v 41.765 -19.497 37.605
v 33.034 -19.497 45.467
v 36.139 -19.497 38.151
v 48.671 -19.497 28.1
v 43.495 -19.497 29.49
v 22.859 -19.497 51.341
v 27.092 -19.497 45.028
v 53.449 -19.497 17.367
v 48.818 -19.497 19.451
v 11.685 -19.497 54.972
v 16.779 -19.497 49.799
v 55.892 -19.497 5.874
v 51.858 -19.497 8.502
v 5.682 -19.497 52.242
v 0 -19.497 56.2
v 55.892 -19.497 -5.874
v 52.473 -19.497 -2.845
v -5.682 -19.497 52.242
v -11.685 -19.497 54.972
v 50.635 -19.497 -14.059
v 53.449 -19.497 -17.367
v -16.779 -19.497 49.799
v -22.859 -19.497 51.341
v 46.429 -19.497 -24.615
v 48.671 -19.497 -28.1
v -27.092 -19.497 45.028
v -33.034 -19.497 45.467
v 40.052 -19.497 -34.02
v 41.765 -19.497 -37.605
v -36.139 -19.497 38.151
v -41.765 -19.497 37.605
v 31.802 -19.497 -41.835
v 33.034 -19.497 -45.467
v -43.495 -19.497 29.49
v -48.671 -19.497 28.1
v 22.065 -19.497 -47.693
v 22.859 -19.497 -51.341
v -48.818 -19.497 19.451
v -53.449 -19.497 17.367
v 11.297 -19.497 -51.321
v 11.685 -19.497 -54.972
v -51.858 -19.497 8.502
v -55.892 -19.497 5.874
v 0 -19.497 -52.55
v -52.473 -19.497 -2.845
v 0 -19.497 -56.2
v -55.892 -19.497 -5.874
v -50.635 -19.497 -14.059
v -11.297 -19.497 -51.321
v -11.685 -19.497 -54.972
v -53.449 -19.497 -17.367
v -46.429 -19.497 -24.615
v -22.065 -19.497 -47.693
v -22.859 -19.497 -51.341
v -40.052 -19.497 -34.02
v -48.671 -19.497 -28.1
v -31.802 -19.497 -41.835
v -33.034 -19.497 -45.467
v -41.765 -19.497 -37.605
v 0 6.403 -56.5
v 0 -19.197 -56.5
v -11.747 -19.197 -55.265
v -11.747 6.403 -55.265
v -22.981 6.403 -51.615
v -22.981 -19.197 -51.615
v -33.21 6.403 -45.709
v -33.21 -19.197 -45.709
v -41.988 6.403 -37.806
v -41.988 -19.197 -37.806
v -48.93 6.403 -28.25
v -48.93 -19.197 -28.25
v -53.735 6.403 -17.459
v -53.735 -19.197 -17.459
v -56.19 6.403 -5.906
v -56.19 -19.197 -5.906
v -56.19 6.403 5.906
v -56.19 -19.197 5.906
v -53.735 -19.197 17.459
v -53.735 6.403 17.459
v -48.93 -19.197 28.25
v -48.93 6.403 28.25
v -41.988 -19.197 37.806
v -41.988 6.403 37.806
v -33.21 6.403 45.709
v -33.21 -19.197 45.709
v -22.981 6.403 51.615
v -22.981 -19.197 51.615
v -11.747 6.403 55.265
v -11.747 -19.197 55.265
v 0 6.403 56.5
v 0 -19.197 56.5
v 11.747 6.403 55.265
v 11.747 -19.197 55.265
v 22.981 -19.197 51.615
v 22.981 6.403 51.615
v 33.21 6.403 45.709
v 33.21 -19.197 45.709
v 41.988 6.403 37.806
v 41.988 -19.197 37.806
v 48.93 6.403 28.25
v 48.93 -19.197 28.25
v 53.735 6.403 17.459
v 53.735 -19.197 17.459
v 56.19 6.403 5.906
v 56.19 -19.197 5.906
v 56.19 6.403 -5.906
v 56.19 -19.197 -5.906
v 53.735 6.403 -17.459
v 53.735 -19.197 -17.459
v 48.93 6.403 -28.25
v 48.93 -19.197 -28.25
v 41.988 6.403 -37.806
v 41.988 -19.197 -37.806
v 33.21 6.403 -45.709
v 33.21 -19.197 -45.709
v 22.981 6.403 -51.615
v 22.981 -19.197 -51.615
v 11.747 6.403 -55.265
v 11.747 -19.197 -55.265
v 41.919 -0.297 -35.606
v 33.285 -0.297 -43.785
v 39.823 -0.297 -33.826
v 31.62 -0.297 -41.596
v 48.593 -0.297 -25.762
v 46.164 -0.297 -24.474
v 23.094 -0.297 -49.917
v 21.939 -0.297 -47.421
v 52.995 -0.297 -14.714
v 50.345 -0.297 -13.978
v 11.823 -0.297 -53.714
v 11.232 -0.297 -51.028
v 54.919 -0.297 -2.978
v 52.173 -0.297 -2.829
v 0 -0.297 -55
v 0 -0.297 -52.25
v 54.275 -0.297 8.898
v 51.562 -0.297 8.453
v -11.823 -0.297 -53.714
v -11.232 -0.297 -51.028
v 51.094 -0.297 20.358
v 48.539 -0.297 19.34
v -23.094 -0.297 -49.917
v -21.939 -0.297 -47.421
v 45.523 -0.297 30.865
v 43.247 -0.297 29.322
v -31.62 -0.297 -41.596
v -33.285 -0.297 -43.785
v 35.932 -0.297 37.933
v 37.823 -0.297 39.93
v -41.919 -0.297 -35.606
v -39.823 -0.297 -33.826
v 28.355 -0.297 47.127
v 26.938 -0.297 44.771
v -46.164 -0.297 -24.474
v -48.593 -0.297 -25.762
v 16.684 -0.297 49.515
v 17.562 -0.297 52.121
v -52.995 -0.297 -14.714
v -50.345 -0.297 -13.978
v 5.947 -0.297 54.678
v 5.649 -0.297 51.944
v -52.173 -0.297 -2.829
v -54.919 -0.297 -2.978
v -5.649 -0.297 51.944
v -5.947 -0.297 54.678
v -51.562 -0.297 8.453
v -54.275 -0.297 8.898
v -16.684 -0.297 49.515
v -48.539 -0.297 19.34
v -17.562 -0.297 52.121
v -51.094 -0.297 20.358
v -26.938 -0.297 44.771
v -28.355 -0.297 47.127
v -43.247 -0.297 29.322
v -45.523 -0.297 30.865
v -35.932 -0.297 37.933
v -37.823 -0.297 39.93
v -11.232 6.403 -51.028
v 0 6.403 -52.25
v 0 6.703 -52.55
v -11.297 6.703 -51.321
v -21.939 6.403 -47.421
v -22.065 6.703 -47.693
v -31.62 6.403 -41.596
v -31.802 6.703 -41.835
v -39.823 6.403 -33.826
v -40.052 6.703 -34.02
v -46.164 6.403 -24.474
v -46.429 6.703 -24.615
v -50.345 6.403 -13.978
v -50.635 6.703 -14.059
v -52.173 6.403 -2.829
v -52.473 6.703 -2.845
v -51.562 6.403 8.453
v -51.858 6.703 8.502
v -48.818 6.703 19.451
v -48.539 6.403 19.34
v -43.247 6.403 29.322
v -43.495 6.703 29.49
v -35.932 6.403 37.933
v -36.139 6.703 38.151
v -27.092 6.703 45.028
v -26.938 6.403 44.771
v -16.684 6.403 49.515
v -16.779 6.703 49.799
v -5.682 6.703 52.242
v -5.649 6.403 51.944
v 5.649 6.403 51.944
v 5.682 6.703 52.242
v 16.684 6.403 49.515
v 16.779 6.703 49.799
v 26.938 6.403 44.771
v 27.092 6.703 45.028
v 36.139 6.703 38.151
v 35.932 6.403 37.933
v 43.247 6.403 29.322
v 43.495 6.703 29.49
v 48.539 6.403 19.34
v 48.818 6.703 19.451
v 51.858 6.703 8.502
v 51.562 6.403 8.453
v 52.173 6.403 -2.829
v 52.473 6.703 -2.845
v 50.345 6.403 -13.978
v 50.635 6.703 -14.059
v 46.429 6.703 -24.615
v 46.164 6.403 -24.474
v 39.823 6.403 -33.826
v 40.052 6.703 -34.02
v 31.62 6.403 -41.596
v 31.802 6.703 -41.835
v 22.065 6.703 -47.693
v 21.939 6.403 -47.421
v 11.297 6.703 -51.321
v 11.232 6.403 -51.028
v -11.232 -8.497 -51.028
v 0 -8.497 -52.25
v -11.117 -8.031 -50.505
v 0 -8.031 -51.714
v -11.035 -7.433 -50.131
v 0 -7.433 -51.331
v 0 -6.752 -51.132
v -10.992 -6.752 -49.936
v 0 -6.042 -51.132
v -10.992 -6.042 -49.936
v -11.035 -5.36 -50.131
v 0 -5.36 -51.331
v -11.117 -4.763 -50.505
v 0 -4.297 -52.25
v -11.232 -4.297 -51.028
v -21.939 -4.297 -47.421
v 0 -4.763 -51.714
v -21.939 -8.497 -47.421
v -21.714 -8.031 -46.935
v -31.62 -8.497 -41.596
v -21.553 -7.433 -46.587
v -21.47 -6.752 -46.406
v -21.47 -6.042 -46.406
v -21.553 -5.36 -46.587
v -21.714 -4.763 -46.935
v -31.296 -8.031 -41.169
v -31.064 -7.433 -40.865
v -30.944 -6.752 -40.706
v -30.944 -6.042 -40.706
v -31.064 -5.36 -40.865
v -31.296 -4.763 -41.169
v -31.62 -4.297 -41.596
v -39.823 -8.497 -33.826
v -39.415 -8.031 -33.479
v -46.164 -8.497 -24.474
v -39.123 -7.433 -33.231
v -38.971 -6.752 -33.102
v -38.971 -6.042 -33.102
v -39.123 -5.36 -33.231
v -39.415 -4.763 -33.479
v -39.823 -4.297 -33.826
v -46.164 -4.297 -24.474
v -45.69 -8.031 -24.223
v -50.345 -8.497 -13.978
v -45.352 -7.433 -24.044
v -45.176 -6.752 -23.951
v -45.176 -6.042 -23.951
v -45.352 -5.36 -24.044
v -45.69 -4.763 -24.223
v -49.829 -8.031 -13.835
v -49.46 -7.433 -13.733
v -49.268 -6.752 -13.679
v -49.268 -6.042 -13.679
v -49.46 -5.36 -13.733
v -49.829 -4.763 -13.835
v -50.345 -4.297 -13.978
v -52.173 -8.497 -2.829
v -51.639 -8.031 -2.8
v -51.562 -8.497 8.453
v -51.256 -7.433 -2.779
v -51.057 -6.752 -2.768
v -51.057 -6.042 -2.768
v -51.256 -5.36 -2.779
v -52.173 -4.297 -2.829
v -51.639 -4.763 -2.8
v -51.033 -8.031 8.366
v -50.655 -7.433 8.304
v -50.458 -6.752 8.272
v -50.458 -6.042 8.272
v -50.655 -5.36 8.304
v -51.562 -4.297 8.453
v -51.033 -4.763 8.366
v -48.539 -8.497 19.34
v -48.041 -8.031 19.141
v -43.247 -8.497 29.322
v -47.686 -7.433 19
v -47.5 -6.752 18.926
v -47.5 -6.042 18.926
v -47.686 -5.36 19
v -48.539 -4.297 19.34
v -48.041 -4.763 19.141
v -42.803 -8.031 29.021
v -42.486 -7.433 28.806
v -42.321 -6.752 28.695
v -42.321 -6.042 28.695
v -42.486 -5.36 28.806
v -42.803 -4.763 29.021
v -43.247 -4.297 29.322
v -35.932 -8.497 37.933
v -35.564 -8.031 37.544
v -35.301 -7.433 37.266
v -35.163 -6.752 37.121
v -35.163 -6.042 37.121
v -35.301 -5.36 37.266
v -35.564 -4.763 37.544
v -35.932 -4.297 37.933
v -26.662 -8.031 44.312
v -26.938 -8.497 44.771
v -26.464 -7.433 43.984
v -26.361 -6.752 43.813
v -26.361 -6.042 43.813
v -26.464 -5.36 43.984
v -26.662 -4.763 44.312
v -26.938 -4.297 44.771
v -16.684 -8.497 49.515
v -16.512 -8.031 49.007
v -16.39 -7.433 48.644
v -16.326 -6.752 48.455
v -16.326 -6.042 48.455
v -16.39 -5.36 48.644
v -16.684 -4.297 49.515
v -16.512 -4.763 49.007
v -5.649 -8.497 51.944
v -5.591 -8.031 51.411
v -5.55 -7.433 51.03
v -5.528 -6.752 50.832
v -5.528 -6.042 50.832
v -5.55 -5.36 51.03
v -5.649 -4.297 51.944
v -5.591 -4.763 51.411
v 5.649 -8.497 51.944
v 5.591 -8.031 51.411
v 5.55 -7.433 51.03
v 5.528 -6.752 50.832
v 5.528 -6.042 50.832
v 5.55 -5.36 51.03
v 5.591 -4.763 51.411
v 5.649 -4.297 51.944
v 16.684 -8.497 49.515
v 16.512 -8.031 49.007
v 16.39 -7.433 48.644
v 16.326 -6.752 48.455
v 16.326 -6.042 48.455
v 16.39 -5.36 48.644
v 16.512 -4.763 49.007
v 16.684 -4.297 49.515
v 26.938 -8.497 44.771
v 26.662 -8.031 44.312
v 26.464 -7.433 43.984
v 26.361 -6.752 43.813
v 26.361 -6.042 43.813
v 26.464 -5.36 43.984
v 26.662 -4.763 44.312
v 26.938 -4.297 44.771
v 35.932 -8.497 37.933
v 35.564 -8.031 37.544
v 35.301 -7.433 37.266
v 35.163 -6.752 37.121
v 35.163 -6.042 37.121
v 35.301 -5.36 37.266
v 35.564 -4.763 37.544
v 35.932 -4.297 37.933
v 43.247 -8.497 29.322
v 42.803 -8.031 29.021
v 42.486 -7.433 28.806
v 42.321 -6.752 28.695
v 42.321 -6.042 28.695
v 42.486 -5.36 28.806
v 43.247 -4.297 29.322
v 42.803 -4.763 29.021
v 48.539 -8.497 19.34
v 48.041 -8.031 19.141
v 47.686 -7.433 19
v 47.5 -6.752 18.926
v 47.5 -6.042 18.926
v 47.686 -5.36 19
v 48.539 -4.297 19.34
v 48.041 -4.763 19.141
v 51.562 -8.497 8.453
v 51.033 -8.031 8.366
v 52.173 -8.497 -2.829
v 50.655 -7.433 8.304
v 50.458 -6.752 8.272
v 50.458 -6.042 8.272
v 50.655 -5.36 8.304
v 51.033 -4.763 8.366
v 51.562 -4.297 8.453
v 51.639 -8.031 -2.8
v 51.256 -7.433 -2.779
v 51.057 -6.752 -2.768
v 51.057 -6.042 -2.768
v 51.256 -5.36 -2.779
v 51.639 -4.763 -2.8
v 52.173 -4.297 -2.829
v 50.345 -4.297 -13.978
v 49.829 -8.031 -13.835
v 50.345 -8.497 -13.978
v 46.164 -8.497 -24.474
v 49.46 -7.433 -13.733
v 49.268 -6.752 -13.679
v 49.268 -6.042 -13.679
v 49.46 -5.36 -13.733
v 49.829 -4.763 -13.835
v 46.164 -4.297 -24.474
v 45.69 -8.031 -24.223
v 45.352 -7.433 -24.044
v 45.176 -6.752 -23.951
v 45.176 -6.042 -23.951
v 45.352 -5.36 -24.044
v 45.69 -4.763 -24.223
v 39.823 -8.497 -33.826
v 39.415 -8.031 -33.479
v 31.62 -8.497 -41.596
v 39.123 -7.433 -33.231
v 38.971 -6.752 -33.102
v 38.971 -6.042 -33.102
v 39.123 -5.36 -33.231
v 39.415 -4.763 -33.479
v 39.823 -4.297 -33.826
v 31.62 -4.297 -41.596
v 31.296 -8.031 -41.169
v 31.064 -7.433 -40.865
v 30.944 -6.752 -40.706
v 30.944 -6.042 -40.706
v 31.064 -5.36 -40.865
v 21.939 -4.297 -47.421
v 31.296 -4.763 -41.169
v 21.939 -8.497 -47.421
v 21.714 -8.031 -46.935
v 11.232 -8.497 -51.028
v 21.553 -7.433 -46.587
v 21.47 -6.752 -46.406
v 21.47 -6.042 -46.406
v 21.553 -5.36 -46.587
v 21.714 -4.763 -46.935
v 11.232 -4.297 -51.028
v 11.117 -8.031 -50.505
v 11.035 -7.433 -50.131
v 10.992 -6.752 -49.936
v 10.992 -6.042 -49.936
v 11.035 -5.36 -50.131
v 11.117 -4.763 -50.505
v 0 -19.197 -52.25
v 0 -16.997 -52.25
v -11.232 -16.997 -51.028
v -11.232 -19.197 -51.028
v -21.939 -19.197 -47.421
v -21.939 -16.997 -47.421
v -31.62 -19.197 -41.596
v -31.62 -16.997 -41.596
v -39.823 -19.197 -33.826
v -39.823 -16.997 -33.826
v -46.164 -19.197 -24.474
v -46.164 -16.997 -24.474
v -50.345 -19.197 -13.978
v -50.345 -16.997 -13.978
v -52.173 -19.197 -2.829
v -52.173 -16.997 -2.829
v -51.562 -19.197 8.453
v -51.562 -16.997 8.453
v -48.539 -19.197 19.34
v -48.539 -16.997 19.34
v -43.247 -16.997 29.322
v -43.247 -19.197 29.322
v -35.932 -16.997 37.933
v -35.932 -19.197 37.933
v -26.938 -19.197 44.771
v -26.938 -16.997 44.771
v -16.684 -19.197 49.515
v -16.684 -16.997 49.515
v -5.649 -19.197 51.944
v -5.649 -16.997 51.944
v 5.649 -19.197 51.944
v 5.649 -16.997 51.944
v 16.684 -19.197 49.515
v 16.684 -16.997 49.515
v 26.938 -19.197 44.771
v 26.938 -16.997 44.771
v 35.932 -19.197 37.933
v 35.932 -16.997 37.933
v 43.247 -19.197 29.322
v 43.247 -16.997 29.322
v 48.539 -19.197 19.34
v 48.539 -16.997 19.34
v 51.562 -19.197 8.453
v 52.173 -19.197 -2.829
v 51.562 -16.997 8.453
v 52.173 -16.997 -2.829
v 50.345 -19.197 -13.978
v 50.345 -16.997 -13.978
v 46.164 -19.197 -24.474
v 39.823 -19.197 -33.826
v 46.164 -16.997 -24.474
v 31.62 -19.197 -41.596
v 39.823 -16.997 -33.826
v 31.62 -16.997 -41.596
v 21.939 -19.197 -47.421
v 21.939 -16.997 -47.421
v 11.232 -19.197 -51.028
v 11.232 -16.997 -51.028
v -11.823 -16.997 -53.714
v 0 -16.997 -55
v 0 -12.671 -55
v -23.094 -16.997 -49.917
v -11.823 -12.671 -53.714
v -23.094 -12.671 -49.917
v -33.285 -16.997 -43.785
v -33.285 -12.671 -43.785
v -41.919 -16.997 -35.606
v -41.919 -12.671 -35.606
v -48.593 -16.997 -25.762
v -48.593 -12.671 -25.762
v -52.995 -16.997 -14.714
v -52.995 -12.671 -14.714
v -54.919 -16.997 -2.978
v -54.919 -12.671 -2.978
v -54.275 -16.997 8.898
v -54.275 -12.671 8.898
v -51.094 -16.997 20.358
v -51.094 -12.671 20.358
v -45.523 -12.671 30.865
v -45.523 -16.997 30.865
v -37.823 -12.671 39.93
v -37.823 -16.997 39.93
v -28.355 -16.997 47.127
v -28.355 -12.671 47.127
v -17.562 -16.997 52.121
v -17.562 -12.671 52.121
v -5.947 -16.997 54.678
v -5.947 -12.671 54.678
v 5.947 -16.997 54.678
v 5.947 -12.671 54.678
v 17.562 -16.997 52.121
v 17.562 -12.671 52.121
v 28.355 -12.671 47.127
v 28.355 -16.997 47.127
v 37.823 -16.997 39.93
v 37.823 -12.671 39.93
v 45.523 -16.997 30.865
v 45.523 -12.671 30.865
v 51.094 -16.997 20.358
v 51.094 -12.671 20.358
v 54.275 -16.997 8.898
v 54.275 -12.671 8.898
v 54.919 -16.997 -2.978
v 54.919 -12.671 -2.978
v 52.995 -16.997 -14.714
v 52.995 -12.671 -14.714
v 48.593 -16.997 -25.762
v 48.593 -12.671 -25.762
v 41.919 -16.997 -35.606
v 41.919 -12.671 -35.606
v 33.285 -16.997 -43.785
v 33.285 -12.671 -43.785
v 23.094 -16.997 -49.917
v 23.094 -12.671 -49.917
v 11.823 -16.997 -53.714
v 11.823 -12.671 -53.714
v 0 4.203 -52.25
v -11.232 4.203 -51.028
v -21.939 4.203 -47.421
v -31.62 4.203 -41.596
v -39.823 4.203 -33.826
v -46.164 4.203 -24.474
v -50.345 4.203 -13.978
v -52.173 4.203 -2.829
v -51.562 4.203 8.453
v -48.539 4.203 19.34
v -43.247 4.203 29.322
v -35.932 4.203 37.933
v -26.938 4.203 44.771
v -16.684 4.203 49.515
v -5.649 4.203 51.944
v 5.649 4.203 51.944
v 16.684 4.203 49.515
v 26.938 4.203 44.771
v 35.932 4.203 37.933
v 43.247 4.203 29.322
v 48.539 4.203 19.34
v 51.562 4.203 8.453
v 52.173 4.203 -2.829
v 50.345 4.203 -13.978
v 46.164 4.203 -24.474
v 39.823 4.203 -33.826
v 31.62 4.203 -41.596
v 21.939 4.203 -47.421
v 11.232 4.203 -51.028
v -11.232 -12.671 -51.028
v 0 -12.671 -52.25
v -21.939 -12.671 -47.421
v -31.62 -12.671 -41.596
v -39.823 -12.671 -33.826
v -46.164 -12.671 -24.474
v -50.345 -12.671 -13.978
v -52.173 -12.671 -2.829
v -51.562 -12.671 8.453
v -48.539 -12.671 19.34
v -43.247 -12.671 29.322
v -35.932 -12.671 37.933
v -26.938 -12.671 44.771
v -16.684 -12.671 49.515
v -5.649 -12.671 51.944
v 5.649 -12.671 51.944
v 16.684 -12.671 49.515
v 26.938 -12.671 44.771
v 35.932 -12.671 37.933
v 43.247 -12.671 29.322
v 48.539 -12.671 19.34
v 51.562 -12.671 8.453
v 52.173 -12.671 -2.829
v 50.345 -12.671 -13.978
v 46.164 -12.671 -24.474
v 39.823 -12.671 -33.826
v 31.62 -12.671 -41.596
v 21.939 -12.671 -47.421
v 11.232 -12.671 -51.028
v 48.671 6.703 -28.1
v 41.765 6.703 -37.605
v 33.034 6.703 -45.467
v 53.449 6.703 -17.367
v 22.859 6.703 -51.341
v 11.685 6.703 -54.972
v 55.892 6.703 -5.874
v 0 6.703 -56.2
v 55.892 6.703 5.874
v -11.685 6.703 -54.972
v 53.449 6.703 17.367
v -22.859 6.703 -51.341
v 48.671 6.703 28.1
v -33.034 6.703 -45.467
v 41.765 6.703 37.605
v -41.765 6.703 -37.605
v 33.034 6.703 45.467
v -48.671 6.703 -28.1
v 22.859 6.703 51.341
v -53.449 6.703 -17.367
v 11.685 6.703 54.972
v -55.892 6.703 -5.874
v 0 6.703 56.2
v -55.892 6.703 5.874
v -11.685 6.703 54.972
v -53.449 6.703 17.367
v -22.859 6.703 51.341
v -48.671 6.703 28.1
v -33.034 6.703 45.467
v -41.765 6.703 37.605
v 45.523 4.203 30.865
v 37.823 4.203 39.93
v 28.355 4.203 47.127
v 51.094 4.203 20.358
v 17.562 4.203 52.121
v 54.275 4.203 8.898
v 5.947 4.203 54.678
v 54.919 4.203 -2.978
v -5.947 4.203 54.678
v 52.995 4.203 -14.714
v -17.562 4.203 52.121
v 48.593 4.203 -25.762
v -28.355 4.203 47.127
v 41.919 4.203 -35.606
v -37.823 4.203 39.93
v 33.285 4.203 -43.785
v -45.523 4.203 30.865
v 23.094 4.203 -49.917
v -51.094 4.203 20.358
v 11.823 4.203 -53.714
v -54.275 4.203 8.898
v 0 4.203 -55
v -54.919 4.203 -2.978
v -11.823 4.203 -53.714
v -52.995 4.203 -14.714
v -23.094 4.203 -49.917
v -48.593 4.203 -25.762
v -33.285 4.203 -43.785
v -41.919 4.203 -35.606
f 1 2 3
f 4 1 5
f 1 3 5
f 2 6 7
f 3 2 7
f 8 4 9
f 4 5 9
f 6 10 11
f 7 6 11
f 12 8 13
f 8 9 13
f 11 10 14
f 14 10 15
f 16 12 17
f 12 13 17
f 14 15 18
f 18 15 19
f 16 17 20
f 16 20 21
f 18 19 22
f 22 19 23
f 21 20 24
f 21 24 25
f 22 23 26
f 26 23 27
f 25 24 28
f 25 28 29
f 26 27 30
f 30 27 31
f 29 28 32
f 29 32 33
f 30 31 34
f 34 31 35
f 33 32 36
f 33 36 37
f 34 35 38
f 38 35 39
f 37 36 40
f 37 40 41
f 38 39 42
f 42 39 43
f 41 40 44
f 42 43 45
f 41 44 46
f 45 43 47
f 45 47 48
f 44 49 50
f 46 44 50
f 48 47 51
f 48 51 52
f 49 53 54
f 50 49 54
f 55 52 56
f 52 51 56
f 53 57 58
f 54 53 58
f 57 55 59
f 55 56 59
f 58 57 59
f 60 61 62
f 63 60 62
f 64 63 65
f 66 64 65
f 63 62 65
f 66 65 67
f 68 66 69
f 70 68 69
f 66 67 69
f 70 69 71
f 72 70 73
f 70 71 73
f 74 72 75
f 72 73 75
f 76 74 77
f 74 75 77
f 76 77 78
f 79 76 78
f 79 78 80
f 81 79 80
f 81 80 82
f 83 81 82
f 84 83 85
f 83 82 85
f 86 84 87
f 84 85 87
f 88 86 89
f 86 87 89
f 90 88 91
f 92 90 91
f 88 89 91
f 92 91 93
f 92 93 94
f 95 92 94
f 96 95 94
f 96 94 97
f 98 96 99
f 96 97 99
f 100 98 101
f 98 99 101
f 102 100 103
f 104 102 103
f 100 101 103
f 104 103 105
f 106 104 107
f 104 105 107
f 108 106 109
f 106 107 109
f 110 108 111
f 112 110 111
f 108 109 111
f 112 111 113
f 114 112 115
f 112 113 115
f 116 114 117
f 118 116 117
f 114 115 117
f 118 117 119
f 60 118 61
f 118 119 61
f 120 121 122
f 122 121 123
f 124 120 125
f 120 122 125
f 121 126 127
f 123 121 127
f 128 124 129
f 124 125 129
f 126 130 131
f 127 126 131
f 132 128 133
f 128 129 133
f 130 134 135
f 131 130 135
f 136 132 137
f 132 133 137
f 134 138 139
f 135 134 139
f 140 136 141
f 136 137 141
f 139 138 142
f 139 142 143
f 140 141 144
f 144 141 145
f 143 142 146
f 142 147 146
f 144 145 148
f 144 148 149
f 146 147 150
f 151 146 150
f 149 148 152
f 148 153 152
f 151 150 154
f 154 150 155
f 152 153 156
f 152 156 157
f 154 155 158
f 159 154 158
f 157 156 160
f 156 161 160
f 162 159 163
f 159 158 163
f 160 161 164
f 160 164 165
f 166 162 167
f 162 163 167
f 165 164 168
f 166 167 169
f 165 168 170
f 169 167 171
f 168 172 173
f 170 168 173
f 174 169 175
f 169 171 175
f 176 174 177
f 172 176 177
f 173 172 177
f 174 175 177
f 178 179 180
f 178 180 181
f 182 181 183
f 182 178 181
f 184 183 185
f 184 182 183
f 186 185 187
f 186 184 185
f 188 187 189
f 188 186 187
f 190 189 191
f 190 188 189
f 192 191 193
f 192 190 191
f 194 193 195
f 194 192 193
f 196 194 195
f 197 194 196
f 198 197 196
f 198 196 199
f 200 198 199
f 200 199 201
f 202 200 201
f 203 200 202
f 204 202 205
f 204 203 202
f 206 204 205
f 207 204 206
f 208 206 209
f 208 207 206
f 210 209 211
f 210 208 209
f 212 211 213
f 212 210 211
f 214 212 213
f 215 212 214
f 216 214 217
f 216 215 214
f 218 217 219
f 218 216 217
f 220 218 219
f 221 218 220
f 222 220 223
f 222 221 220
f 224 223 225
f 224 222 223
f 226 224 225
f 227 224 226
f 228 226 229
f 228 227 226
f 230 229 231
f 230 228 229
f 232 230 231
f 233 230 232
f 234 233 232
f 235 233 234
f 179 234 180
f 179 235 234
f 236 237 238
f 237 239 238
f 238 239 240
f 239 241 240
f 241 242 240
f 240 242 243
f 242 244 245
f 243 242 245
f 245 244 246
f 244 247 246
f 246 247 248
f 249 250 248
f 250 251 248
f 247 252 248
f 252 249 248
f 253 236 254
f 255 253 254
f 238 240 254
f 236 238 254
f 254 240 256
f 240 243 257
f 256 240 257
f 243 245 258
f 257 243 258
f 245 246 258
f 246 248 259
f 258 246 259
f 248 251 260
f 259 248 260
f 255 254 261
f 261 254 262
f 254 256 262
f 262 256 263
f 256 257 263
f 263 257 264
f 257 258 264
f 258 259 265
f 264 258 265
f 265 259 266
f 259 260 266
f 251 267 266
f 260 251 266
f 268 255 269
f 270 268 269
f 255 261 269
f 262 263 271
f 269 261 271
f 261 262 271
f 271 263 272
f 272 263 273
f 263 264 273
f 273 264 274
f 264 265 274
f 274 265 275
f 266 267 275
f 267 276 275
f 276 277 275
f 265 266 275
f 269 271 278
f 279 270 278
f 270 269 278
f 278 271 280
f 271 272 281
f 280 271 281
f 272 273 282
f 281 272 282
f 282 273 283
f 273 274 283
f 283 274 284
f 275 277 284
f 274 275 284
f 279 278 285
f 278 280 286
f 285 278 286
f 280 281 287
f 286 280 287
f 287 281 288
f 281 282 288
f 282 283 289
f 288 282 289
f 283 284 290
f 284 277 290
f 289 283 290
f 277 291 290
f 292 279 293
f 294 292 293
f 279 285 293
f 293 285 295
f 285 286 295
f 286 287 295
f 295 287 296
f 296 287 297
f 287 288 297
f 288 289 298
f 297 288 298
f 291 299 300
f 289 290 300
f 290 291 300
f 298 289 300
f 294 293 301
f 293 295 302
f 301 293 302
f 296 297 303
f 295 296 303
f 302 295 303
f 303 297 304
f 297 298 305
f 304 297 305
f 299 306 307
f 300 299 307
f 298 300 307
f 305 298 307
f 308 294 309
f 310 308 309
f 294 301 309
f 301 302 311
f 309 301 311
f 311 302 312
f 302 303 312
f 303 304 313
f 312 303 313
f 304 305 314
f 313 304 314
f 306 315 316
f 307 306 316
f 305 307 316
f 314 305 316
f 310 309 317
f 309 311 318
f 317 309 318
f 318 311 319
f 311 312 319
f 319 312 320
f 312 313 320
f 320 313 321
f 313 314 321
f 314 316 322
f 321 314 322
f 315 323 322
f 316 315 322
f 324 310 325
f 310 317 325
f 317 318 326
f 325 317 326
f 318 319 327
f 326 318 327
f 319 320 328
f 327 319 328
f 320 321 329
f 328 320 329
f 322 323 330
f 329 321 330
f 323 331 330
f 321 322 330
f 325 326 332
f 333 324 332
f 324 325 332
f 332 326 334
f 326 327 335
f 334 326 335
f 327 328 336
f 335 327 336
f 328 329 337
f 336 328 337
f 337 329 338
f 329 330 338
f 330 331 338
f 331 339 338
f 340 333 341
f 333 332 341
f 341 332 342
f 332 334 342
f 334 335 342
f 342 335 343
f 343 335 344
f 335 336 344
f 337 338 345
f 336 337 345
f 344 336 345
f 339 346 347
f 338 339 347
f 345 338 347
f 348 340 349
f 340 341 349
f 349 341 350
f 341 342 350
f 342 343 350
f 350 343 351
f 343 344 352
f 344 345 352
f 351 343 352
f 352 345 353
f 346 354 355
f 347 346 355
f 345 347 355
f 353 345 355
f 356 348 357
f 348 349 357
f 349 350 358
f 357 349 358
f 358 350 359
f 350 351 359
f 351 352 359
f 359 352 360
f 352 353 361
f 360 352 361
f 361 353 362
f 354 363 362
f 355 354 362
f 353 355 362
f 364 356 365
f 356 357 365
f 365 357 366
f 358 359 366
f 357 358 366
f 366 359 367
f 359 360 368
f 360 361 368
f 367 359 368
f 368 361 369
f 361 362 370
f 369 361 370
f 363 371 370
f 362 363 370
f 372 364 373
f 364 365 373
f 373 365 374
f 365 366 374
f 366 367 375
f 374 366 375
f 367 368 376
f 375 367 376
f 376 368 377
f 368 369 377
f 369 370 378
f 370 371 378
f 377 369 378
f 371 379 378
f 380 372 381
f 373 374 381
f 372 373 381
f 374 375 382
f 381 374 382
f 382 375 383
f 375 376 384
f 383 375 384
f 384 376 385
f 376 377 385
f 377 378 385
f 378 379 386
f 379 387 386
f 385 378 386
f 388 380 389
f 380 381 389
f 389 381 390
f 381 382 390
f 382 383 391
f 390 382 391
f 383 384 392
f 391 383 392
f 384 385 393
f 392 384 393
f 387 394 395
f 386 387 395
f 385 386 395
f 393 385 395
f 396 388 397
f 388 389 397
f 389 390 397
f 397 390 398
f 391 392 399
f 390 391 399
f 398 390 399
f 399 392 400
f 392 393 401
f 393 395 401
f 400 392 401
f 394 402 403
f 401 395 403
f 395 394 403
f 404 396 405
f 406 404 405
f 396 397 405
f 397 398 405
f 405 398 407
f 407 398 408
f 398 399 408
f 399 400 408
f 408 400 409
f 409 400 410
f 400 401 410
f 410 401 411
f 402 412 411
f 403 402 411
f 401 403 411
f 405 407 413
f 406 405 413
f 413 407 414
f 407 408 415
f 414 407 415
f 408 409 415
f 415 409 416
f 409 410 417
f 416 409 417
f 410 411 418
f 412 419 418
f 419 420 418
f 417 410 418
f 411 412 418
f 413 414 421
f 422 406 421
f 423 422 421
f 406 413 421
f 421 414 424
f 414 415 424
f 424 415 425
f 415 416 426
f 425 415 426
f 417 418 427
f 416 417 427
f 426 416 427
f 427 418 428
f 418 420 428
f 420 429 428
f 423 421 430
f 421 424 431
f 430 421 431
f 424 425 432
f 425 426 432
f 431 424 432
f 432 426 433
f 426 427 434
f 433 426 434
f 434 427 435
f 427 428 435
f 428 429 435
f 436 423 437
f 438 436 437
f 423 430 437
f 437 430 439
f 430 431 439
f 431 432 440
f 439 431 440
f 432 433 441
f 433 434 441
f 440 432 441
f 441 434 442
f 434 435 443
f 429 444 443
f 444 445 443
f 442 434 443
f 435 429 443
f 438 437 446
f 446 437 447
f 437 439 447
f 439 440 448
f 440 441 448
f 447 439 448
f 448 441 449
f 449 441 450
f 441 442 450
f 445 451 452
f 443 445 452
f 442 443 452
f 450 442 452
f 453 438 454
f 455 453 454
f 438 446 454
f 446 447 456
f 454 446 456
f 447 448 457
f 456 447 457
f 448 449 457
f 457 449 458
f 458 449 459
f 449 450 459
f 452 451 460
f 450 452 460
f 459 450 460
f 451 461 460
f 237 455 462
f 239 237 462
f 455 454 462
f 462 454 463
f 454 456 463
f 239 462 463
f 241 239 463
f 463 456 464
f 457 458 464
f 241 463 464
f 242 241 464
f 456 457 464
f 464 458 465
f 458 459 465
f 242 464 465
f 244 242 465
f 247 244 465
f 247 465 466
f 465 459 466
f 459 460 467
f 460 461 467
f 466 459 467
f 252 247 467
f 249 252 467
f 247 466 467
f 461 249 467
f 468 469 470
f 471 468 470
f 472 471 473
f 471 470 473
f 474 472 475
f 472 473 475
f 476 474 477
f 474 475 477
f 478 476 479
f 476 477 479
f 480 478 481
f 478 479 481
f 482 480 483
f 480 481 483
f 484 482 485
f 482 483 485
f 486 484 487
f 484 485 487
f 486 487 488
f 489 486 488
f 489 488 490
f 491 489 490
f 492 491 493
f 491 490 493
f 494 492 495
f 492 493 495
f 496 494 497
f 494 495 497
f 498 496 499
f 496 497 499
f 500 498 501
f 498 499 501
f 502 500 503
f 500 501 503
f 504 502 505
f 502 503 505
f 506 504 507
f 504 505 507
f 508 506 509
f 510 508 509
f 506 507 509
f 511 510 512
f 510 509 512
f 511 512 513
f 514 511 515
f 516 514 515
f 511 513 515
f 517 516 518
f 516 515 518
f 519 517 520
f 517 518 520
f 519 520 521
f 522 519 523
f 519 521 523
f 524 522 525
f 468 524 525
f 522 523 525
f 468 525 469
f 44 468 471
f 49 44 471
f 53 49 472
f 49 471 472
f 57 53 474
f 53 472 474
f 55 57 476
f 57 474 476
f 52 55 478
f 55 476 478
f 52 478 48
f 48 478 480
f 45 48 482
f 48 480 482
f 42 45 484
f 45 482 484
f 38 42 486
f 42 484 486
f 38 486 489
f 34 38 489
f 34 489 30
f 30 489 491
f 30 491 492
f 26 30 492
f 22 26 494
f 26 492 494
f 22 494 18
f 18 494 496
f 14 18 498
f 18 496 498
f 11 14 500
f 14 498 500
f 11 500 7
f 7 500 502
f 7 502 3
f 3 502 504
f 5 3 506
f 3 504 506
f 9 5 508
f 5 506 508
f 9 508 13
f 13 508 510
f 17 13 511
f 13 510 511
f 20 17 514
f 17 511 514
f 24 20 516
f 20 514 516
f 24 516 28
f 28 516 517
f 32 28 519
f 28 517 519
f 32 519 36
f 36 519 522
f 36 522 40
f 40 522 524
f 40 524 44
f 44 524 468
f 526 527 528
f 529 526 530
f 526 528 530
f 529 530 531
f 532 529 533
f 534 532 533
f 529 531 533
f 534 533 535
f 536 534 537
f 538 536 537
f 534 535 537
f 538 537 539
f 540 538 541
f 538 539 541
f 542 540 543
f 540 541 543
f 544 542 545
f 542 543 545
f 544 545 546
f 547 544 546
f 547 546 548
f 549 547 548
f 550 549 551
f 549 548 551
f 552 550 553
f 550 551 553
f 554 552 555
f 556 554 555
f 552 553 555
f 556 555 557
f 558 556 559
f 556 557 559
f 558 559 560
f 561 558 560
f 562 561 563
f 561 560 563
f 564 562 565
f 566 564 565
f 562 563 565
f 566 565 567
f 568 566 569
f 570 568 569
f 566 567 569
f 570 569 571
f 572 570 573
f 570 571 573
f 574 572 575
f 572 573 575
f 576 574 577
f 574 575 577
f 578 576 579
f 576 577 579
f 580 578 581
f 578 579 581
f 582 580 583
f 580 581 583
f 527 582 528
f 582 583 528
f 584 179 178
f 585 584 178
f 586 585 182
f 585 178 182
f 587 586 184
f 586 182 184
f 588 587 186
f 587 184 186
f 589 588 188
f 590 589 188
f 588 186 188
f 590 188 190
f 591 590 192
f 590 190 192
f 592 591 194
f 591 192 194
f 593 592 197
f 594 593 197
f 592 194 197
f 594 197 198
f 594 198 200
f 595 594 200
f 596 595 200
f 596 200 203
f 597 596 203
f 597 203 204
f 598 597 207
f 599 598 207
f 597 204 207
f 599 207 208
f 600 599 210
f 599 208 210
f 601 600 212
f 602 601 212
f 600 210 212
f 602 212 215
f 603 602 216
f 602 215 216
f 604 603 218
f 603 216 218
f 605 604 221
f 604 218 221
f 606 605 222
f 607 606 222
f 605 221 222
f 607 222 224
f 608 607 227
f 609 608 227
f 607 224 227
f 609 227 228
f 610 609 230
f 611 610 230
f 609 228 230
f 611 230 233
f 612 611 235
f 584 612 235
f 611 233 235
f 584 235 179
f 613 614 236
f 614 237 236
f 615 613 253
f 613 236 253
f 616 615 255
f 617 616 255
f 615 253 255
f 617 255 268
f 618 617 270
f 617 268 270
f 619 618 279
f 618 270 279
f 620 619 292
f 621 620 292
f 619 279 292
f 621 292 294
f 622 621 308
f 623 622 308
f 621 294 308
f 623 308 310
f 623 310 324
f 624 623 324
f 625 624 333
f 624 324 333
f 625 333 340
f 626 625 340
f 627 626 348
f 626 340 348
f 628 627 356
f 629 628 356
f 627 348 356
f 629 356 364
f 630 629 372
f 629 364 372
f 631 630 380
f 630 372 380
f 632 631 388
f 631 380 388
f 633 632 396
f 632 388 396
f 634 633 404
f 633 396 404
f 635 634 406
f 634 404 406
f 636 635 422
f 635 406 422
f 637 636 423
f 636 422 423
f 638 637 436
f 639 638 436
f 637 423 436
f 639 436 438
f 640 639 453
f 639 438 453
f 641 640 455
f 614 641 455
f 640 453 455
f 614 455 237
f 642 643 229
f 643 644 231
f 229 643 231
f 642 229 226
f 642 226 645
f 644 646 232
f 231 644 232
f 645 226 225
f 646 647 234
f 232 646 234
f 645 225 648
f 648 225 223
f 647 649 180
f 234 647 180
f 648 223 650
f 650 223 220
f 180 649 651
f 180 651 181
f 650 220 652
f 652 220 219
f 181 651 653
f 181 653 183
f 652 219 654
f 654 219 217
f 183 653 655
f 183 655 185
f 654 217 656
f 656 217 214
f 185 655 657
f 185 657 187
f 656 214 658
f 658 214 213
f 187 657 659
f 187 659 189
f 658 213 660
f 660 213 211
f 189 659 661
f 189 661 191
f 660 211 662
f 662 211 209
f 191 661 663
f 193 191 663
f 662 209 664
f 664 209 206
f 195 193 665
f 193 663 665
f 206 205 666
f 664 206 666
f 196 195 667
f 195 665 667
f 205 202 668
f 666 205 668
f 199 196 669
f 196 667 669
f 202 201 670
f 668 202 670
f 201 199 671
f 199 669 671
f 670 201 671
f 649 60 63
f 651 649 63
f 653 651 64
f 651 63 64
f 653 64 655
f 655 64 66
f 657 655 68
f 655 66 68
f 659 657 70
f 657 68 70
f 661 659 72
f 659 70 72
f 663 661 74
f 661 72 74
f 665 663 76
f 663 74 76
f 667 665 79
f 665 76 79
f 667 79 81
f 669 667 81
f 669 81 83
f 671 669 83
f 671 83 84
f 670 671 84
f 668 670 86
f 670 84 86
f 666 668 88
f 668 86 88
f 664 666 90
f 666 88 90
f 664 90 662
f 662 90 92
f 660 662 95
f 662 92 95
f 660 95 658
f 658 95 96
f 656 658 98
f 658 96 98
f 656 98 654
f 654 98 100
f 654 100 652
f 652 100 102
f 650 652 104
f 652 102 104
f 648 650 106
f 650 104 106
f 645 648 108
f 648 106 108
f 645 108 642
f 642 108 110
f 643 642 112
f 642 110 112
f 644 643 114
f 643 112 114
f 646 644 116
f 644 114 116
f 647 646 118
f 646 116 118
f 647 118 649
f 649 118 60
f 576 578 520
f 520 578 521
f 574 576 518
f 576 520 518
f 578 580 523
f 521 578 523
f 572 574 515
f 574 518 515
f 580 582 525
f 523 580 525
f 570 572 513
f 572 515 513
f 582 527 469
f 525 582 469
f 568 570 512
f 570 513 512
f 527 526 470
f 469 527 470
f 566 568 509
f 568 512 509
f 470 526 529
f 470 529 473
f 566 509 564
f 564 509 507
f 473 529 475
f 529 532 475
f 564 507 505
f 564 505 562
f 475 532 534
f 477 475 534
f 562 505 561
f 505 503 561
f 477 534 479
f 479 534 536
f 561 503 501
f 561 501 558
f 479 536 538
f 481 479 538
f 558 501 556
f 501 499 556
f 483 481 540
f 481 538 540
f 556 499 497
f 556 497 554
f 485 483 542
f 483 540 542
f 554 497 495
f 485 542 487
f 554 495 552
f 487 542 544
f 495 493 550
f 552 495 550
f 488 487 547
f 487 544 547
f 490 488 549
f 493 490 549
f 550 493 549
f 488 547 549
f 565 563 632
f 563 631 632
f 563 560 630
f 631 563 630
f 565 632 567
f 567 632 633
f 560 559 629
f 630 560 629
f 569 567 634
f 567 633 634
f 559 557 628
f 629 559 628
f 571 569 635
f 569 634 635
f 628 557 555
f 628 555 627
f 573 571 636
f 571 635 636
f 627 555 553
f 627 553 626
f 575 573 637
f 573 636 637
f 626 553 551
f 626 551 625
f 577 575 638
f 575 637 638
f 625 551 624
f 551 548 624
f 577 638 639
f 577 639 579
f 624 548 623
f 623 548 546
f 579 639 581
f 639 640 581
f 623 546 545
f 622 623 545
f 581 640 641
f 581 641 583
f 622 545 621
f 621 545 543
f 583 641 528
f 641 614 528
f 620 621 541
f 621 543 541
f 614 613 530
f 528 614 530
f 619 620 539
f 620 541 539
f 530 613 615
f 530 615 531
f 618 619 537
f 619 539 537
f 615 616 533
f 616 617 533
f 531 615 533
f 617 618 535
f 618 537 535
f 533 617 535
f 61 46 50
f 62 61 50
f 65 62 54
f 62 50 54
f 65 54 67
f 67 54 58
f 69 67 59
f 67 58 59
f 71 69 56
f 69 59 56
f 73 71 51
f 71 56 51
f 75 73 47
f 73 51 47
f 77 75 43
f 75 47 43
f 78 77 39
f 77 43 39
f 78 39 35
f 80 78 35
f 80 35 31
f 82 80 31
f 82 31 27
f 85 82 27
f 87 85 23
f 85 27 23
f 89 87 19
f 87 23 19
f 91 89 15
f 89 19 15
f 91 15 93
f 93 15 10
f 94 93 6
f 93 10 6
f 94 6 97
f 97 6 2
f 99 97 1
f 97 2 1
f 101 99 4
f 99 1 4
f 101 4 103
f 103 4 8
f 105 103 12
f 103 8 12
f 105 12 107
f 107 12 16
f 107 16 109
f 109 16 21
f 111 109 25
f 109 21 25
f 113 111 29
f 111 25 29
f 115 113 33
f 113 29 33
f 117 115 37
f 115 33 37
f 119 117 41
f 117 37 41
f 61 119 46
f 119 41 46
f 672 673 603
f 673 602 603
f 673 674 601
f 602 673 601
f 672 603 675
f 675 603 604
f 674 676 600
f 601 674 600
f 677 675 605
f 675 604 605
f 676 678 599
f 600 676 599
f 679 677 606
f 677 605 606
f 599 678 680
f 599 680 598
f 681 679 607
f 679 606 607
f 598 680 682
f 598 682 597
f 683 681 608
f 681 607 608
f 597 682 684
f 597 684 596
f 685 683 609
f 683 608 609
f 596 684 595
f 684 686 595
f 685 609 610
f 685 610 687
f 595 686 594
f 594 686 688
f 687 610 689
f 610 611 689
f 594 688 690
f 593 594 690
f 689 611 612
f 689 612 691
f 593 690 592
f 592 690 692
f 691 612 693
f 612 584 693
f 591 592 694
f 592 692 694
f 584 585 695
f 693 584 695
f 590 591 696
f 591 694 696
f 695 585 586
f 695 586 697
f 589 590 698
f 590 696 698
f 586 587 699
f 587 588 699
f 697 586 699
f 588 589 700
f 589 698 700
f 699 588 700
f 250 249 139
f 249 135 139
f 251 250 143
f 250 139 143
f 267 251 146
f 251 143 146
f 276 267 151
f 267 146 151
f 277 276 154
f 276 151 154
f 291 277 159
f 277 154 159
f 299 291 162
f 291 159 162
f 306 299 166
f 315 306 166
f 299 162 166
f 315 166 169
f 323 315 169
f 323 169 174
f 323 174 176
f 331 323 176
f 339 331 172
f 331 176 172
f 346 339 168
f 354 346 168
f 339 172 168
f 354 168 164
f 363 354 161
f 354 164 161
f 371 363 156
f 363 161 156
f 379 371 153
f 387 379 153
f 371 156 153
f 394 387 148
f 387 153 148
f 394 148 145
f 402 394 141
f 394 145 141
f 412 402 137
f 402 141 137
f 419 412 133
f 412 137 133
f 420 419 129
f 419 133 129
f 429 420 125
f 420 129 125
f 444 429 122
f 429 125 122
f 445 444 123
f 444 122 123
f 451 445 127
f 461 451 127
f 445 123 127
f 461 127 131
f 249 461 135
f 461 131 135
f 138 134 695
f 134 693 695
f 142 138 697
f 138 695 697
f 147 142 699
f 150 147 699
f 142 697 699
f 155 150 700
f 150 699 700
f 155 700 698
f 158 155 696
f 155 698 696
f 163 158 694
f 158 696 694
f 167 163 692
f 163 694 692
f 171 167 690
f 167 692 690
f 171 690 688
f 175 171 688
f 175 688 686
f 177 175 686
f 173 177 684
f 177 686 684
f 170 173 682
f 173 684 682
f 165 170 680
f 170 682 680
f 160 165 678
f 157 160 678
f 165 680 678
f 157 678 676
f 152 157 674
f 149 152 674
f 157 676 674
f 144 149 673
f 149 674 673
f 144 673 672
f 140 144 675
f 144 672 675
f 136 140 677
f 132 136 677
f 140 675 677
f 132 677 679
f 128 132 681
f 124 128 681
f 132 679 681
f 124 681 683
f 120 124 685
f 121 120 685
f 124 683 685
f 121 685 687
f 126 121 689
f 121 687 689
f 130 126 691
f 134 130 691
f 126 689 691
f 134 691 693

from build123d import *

# Parameters (mm, degrees)
CHANFRO1_SIZE = 0.3


with BuildPart() as part:
    # Esboço1 → Revolução1 (revolve)
    with BuildSketch(Plane.XY, mode=Mode.PRIVATE) as revolu_o1_sk:
        with BuildLine():
            Line((52.25, 6.703459888), (56.5, 6.703459888))
            Line((56.5, 6.703459888), (56.5, -19.496540112))
            Line((56.5, -19.496540112), (52.25, -19.496540112))
            Line((52.25, -19.496540112), (52.25, -16.996540112))
            Line((52.25, -16.996540112), (55, -16.996540112))
            Line((55, -16.996540112), (55, -12.670733082))
            Line((55, -12.670733082), (52.25, -12.670733082))
            Line((52.25, -12.670733082), (52.25, -8.496540112))
            ThreePointArc((52.25, -8.496540112), (51.106465997, -6.396540112), (52.25, -4.296540112))
            Line((52.25, -4.296540112), (52.25, -0.296540112))
            Line((52.25, -0.296540112), (55, -0.296540112))
            Line((55, -0.296540112), (55, 4.203459888))
            Line((55, 4.203459888), (52.25, 4.203459888))
            Line((52.25, 4.203459888), (52.25, 6.703459888))
        make_face()
    revolve(revolu_o1_sk.sketch.rotate(Axis((0, -46.184315802, 0), (0, 1, 0)), 90), axis=Axis((0, -46.184315802, 0), (0, 1, 0)))

    # Chanfro1
    chanfro1_edges = [part.edges().sort_by_distance(p)[0] for p in [
        (0, -19.496540112, 52.25),
        (0, -19.496540112, 56.5),
        (0, 6.703459888, 56.5),
        (0, 6.703459888, 52.25),
    ]]
    chamfer(chanfro1_edges, length=CHANFRO1_SIZE)


solid = part.part
